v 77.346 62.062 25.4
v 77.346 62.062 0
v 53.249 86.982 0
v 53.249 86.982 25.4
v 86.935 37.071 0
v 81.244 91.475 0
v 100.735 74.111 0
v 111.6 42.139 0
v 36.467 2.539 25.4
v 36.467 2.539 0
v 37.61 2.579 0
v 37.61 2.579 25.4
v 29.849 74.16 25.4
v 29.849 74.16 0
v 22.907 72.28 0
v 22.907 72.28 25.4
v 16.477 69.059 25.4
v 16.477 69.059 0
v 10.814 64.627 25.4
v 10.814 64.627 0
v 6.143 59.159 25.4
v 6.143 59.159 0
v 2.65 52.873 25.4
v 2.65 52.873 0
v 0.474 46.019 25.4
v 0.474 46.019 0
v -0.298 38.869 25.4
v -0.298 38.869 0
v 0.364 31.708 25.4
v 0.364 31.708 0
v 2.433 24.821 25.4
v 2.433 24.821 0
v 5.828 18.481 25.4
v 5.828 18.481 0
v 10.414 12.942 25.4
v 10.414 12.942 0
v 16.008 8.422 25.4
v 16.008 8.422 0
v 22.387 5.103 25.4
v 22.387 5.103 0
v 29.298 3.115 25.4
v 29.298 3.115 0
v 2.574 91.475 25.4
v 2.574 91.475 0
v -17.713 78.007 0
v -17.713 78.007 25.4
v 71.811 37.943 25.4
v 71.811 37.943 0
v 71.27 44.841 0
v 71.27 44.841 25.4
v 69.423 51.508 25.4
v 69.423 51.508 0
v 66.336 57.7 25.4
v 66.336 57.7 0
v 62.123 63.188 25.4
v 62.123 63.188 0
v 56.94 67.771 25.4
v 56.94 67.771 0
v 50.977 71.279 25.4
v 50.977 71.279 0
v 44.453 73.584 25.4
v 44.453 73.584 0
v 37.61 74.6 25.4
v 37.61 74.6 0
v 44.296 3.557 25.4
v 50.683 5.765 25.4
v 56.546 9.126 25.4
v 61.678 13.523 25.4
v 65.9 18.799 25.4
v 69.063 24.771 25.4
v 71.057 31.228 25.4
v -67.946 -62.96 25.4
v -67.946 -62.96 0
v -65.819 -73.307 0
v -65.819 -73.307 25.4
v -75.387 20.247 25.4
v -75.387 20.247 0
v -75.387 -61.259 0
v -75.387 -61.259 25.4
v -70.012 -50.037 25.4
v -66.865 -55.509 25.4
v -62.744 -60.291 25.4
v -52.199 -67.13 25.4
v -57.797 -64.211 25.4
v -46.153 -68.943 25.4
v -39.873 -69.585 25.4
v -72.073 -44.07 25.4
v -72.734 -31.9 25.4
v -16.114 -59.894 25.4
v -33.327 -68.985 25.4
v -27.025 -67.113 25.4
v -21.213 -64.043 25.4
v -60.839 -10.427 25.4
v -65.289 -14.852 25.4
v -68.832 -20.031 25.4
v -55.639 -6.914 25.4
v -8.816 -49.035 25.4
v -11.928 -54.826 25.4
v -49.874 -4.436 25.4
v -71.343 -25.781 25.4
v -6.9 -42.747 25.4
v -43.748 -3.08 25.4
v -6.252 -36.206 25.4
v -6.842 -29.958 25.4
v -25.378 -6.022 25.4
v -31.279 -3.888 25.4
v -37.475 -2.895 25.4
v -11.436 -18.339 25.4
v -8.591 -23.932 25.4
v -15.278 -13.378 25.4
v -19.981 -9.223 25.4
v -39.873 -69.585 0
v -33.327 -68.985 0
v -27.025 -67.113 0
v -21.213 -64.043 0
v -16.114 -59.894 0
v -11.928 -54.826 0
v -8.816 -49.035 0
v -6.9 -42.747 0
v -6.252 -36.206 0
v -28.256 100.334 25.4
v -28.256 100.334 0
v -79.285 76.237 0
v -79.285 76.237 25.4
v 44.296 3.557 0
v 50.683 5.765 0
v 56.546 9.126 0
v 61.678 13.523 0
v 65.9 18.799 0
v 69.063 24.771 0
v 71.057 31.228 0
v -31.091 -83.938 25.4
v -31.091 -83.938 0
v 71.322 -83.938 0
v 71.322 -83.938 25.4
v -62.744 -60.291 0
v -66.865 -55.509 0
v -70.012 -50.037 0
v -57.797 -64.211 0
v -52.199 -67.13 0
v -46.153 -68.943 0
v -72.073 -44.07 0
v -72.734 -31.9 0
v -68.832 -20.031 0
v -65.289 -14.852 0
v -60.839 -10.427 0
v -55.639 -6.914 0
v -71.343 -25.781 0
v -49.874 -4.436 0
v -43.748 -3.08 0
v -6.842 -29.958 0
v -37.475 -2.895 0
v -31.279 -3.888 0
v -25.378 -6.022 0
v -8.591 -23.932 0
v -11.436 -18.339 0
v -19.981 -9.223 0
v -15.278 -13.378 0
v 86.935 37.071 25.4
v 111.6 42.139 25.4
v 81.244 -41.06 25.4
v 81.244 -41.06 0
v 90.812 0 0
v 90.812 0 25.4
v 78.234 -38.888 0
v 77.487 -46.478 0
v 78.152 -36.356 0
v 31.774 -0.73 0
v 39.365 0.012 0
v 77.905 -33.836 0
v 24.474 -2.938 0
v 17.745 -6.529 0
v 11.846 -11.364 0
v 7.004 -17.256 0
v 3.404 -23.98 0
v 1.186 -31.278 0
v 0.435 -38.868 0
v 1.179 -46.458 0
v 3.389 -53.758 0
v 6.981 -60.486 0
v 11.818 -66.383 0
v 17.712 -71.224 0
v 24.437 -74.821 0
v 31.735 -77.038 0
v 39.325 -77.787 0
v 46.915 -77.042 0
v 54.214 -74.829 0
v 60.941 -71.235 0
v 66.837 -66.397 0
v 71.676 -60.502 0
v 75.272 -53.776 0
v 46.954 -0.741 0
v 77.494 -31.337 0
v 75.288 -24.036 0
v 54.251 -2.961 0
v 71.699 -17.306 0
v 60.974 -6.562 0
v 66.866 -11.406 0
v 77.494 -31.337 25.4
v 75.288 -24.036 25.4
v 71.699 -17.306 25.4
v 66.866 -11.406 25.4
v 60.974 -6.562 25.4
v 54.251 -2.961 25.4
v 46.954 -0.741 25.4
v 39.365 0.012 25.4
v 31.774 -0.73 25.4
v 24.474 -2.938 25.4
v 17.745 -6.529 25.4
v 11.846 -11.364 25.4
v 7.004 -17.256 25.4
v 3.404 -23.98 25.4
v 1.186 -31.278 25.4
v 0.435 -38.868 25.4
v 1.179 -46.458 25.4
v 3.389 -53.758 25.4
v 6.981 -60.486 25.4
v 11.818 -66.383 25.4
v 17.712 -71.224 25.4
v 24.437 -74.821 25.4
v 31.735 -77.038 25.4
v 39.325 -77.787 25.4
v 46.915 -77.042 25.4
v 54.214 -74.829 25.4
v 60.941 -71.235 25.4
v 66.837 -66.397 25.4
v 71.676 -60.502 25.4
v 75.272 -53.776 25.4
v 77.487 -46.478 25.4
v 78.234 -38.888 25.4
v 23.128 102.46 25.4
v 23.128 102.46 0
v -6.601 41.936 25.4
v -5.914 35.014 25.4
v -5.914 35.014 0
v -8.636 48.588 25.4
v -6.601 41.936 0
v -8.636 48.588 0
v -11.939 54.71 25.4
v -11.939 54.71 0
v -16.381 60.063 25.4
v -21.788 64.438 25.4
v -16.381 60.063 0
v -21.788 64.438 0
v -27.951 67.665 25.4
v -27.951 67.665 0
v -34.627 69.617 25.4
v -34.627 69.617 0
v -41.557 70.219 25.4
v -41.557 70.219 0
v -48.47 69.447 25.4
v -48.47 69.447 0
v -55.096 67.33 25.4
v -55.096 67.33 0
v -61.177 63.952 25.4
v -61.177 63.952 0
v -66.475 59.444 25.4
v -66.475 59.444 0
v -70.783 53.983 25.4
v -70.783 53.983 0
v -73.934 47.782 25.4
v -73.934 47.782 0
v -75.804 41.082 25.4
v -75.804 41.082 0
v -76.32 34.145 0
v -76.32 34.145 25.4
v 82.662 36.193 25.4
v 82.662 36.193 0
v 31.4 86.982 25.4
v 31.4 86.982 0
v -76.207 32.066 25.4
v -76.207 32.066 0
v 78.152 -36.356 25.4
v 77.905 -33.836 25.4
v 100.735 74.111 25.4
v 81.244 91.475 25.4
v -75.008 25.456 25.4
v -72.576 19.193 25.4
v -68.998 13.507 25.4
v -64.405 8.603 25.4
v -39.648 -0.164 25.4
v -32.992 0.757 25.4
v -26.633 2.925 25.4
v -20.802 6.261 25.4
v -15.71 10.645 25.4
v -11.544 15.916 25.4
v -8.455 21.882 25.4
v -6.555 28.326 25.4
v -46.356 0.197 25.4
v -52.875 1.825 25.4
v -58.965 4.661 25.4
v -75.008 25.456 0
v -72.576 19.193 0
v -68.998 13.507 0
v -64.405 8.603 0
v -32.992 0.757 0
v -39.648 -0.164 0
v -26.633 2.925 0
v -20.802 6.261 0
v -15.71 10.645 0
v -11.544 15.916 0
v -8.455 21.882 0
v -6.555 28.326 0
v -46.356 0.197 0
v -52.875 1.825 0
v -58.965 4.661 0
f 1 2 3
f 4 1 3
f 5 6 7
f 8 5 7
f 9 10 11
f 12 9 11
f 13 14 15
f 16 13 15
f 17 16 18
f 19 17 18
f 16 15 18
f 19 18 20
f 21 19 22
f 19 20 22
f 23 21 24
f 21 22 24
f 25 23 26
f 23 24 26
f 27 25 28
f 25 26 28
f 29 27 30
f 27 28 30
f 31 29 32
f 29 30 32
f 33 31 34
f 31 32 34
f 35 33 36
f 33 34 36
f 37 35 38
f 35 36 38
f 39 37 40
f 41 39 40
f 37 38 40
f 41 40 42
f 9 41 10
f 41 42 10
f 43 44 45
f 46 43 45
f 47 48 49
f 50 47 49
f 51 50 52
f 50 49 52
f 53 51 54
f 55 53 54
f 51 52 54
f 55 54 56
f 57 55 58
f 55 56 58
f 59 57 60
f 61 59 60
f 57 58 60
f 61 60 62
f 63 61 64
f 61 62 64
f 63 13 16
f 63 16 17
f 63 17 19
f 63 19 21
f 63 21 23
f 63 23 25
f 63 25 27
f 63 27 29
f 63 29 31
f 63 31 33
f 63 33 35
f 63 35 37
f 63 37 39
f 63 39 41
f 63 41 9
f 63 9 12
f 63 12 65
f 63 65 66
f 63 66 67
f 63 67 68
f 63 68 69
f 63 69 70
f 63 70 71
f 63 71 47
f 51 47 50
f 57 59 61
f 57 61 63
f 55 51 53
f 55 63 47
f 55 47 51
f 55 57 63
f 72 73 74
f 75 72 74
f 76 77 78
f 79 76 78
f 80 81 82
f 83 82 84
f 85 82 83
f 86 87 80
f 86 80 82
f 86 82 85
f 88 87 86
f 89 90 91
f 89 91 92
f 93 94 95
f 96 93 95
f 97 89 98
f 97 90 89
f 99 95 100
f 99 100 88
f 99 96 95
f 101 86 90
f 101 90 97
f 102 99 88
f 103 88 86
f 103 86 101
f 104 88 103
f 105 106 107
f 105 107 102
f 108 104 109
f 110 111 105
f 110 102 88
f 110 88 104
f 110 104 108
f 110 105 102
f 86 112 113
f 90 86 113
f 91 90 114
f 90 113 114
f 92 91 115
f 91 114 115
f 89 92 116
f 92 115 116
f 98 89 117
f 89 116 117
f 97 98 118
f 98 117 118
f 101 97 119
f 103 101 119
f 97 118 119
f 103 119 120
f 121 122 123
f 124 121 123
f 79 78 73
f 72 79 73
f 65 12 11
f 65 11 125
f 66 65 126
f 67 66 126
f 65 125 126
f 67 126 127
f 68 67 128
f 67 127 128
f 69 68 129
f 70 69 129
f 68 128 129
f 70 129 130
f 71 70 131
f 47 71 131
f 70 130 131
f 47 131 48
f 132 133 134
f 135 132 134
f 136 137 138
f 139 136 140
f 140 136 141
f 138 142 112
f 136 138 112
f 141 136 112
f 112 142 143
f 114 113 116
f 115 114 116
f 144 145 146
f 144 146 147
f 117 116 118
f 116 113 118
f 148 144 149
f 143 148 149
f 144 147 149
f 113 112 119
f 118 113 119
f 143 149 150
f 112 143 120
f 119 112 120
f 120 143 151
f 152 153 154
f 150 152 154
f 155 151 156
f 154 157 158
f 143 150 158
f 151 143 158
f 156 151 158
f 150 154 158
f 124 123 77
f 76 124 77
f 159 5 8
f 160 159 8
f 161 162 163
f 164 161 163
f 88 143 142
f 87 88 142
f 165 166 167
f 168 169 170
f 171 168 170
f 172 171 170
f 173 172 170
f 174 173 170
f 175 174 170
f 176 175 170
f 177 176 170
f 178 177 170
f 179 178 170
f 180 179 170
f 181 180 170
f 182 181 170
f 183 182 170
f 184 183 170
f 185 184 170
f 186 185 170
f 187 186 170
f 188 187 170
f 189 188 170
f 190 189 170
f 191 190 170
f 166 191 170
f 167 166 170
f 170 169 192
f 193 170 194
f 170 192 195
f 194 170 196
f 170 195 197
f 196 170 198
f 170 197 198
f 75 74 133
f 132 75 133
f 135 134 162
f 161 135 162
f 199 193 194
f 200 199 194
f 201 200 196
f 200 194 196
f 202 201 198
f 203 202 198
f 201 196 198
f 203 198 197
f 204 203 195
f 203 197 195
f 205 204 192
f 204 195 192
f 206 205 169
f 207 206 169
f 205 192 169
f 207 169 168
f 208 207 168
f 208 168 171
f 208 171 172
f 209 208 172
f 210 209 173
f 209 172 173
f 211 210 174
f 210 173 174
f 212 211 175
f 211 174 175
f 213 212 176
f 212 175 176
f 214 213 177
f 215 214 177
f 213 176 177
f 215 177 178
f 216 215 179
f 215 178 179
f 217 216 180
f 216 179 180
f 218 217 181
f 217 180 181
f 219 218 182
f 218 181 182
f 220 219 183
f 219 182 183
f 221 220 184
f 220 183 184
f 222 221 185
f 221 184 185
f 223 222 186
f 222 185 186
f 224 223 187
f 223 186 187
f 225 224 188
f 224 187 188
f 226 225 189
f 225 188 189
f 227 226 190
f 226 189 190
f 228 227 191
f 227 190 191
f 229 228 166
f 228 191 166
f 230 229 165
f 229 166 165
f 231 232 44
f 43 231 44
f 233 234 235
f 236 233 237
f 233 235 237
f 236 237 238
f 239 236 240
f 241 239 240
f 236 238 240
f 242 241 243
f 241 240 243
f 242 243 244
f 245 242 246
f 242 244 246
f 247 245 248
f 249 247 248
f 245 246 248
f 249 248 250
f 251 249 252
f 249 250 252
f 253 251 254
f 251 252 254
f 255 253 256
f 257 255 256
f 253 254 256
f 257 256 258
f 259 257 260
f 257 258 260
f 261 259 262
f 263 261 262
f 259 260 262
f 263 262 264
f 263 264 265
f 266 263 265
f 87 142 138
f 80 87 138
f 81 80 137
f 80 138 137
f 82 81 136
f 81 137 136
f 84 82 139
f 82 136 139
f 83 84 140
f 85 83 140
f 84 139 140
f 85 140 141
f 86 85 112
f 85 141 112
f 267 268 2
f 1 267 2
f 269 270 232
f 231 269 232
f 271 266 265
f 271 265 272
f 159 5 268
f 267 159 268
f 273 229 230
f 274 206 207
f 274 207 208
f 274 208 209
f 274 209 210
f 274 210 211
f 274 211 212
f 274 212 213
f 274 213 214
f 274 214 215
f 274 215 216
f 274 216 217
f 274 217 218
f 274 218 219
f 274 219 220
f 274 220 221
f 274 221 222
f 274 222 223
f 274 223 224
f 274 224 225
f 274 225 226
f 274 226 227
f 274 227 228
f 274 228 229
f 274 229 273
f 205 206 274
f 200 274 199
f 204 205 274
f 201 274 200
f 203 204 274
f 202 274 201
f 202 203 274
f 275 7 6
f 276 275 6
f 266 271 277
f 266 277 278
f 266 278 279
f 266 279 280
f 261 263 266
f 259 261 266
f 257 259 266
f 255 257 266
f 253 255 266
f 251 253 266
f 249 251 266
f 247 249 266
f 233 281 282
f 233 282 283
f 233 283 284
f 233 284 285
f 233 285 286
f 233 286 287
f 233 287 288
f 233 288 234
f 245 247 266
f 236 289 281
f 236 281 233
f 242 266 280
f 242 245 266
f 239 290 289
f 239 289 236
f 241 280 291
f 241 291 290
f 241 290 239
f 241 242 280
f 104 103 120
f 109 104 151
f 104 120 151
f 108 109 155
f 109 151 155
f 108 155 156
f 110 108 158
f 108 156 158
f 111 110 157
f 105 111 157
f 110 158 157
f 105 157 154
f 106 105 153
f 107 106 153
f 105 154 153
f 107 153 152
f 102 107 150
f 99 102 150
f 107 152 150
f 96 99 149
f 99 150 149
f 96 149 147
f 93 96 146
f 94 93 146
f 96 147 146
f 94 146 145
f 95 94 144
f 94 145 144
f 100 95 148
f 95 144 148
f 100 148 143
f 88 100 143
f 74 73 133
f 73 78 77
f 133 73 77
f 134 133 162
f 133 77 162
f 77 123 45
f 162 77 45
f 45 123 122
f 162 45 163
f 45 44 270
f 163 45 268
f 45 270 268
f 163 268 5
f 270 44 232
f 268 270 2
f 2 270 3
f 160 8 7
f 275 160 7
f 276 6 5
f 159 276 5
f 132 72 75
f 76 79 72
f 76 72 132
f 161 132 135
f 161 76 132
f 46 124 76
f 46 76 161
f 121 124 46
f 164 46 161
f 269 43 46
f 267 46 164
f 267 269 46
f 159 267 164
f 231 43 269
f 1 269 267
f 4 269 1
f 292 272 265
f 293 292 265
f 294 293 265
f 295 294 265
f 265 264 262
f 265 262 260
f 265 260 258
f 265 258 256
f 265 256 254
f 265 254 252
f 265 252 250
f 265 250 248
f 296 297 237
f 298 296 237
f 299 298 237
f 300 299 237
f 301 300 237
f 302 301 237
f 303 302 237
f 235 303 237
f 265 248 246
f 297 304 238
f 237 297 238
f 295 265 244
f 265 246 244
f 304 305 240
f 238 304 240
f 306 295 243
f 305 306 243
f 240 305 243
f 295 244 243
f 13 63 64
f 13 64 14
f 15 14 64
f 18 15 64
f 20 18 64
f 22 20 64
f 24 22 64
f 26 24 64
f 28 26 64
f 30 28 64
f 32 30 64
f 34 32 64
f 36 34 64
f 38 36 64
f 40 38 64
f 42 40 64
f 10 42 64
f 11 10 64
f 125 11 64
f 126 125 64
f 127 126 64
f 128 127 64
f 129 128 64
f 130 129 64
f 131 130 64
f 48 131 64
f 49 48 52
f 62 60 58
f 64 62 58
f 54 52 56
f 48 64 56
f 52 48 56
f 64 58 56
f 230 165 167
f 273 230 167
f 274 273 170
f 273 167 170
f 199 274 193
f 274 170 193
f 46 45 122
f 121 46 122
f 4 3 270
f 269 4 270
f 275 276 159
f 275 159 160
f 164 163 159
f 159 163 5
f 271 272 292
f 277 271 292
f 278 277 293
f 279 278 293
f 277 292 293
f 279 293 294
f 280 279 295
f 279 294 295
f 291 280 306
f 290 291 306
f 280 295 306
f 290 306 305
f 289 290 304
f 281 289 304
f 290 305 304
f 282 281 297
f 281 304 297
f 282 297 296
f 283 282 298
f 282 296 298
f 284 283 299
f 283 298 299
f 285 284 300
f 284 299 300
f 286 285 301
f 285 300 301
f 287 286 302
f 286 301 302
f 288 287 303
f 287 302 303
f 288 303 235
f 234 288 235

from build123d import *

# Parameters (mm, degrees)
F1_DEPTH = 25.4
F3_DEPTH = 25.4


with BuildPart() as f1:
    # F0 (on Top) → F1 (new body)
    with BuildSketch(Plane.XY):
        with BuildLine():
            ThreePointArc((78.2343375317, -38.8875417411), (78.048917721, -35.093966718), (77.4944259328, -31.3365565967))
            ThreePointArc((77.4944259328, -31.3365565967), (10.6262096015, -12.6381966062), (35.2216652385, -77.5693184483))
            ThreePointArc((35.2216652385, -77.5693184483), (65.3461180523, -67.8114497889), (78.2343375317, -38.8875417411))
        make_face()
    extrude(amount=F1_DEPTH)


with BuildPart() as f1b:
    # F0 (on Top) → F1, piece 2 (new body)
    with BuildSketch(Plane.XY):
        with BuildLine():
            ThreePointArc((-6.2524450904, -36.2056419253), (-37.4752368875, -2.8953557766), (-72.7337433977, -31.9001072768))
            Line((-72.7337433977, -31.9001072768), (-72.0729454344, -44.0699552738))
            ThreePointArc((-72.0729454344, -44.0699552738), (-60.3632317439, -62.3679498344), (-39.872979752, -69.5848448014))
            ThreePointArc((-39.872979752, -69.5848448014), (-16.1144120599, -59.8937799673), (-6.2524450904, -36.2056419253))
        make_face()
    extrude(amount=F1_DEPTH)


with BuildPart() as f1c:
    # F0 (on Top) → F1, piece 3 (new body)
    with BuildSketch(Plane.XY):
        with BuildLine():
            ThreePointArc((-39.872979752, -0.1722453775), (-15.7886590754, 10.5635413936), (-5.9143486462, 35.0136868656))
            ThreePointArc((-5.9143486462, 35.0136868656), (-15.812898711, 59.4889231298), (-39.9427123553, 70.2020261848))
            ThreePointArc((-39.9427123553, 70.2020261848), (-65.9081737617, 60.0192735106), (-76.3198448883, 34.1447543379))
            Line((-76.3198448883, 34.1447543379), (-76.206997413, 32.0664540136))
            ThreePointArc((-76.206997413, 32.0664540136), (-64.4898773463, 8.6778789249), (-39.872979752, -0.1722453775))
        make_face()
    extrude(amount=F1_DEPTH)


with BuildPart() as f1d:
    # F0 (on Top) → F1, piece 4 (new body)
    with BuildSketch(Plane.XY):
        with BuildLine():
            Line((37.6095230227, 74.5998945164), (29.8485713548, 74.1597828497))
            ThreePointArc((29.8485713548, 74.1597828497), (-0.1462480838, 35.2717518042), (36.4667453689, 2.5386361233))
            Line((36.4667453689, 2.5386361233), (37.6095230227, 2.579217024))
            ThreePointArc((37.6095230227, 2.579217024), (61.678058159, 13.5225465108), (71.8107426066, 37.9434299868))
            ThreePointArc((71.8107426066, 37.9434299868), (71.8150846811, 38.2664799099), (71.816532078, 38.5895557702))
            ThreePointArc((71.816532078, 38.5895557702), (61.9016162696, 63.4233229286), (37.6095230227, 74.5998945164))
        make_face()
    extrude(amount=F1_DEPTH)


with BuildPart() as f3:
    # F2 (on Top) → F3 (new body)
    with BuildSketch(Plane.XY):
        Polygon((81.2444016337, 91.4750024676), (86.9348665273, 37.0712211168), (111.6003593864, 42.1394729282), (100.734770298, 74.1108506918), align=None)
    extrude(amount=F3_DEPTH)


with BuildPart() as f3b:
    # F2 (on Top) → F3, piece 2 (new body)
    with BuildSketch(Plane.XY):
        Polygon((-75.3873363137, -61.2586587667), (-67.9455606753, -62.9596359278), (-65.8193379641, -73.3072534204), (-31.0910325497, -83.9383676648), (71.3220313191, -83.9383676648), (81.2444016337, -41.0595424473), (90.8123999834, 0), (86.9348665273, 37.0712211168), (82.6618820429, 36.1932106316), (77.3463249207, 62.0622560382), (53.2491393387, 86.9824013656), (31.4004077564, 86.9824013656), (23.1276452541, 102.4604812264), (2.5741581339, 91.4750024676), (-17.712602534, 78.0069069132), (-28.2560698688, 100.3342568874), (-79.2854130268, 76.2370750308), (-75.3873363137, 20.2465429902), align=None)
    extrude(amount=F3_DEPTH)


solid = Compound([f1.part, f1b.part, f1c.part, f1d.part, f3.part, f3b.part])
